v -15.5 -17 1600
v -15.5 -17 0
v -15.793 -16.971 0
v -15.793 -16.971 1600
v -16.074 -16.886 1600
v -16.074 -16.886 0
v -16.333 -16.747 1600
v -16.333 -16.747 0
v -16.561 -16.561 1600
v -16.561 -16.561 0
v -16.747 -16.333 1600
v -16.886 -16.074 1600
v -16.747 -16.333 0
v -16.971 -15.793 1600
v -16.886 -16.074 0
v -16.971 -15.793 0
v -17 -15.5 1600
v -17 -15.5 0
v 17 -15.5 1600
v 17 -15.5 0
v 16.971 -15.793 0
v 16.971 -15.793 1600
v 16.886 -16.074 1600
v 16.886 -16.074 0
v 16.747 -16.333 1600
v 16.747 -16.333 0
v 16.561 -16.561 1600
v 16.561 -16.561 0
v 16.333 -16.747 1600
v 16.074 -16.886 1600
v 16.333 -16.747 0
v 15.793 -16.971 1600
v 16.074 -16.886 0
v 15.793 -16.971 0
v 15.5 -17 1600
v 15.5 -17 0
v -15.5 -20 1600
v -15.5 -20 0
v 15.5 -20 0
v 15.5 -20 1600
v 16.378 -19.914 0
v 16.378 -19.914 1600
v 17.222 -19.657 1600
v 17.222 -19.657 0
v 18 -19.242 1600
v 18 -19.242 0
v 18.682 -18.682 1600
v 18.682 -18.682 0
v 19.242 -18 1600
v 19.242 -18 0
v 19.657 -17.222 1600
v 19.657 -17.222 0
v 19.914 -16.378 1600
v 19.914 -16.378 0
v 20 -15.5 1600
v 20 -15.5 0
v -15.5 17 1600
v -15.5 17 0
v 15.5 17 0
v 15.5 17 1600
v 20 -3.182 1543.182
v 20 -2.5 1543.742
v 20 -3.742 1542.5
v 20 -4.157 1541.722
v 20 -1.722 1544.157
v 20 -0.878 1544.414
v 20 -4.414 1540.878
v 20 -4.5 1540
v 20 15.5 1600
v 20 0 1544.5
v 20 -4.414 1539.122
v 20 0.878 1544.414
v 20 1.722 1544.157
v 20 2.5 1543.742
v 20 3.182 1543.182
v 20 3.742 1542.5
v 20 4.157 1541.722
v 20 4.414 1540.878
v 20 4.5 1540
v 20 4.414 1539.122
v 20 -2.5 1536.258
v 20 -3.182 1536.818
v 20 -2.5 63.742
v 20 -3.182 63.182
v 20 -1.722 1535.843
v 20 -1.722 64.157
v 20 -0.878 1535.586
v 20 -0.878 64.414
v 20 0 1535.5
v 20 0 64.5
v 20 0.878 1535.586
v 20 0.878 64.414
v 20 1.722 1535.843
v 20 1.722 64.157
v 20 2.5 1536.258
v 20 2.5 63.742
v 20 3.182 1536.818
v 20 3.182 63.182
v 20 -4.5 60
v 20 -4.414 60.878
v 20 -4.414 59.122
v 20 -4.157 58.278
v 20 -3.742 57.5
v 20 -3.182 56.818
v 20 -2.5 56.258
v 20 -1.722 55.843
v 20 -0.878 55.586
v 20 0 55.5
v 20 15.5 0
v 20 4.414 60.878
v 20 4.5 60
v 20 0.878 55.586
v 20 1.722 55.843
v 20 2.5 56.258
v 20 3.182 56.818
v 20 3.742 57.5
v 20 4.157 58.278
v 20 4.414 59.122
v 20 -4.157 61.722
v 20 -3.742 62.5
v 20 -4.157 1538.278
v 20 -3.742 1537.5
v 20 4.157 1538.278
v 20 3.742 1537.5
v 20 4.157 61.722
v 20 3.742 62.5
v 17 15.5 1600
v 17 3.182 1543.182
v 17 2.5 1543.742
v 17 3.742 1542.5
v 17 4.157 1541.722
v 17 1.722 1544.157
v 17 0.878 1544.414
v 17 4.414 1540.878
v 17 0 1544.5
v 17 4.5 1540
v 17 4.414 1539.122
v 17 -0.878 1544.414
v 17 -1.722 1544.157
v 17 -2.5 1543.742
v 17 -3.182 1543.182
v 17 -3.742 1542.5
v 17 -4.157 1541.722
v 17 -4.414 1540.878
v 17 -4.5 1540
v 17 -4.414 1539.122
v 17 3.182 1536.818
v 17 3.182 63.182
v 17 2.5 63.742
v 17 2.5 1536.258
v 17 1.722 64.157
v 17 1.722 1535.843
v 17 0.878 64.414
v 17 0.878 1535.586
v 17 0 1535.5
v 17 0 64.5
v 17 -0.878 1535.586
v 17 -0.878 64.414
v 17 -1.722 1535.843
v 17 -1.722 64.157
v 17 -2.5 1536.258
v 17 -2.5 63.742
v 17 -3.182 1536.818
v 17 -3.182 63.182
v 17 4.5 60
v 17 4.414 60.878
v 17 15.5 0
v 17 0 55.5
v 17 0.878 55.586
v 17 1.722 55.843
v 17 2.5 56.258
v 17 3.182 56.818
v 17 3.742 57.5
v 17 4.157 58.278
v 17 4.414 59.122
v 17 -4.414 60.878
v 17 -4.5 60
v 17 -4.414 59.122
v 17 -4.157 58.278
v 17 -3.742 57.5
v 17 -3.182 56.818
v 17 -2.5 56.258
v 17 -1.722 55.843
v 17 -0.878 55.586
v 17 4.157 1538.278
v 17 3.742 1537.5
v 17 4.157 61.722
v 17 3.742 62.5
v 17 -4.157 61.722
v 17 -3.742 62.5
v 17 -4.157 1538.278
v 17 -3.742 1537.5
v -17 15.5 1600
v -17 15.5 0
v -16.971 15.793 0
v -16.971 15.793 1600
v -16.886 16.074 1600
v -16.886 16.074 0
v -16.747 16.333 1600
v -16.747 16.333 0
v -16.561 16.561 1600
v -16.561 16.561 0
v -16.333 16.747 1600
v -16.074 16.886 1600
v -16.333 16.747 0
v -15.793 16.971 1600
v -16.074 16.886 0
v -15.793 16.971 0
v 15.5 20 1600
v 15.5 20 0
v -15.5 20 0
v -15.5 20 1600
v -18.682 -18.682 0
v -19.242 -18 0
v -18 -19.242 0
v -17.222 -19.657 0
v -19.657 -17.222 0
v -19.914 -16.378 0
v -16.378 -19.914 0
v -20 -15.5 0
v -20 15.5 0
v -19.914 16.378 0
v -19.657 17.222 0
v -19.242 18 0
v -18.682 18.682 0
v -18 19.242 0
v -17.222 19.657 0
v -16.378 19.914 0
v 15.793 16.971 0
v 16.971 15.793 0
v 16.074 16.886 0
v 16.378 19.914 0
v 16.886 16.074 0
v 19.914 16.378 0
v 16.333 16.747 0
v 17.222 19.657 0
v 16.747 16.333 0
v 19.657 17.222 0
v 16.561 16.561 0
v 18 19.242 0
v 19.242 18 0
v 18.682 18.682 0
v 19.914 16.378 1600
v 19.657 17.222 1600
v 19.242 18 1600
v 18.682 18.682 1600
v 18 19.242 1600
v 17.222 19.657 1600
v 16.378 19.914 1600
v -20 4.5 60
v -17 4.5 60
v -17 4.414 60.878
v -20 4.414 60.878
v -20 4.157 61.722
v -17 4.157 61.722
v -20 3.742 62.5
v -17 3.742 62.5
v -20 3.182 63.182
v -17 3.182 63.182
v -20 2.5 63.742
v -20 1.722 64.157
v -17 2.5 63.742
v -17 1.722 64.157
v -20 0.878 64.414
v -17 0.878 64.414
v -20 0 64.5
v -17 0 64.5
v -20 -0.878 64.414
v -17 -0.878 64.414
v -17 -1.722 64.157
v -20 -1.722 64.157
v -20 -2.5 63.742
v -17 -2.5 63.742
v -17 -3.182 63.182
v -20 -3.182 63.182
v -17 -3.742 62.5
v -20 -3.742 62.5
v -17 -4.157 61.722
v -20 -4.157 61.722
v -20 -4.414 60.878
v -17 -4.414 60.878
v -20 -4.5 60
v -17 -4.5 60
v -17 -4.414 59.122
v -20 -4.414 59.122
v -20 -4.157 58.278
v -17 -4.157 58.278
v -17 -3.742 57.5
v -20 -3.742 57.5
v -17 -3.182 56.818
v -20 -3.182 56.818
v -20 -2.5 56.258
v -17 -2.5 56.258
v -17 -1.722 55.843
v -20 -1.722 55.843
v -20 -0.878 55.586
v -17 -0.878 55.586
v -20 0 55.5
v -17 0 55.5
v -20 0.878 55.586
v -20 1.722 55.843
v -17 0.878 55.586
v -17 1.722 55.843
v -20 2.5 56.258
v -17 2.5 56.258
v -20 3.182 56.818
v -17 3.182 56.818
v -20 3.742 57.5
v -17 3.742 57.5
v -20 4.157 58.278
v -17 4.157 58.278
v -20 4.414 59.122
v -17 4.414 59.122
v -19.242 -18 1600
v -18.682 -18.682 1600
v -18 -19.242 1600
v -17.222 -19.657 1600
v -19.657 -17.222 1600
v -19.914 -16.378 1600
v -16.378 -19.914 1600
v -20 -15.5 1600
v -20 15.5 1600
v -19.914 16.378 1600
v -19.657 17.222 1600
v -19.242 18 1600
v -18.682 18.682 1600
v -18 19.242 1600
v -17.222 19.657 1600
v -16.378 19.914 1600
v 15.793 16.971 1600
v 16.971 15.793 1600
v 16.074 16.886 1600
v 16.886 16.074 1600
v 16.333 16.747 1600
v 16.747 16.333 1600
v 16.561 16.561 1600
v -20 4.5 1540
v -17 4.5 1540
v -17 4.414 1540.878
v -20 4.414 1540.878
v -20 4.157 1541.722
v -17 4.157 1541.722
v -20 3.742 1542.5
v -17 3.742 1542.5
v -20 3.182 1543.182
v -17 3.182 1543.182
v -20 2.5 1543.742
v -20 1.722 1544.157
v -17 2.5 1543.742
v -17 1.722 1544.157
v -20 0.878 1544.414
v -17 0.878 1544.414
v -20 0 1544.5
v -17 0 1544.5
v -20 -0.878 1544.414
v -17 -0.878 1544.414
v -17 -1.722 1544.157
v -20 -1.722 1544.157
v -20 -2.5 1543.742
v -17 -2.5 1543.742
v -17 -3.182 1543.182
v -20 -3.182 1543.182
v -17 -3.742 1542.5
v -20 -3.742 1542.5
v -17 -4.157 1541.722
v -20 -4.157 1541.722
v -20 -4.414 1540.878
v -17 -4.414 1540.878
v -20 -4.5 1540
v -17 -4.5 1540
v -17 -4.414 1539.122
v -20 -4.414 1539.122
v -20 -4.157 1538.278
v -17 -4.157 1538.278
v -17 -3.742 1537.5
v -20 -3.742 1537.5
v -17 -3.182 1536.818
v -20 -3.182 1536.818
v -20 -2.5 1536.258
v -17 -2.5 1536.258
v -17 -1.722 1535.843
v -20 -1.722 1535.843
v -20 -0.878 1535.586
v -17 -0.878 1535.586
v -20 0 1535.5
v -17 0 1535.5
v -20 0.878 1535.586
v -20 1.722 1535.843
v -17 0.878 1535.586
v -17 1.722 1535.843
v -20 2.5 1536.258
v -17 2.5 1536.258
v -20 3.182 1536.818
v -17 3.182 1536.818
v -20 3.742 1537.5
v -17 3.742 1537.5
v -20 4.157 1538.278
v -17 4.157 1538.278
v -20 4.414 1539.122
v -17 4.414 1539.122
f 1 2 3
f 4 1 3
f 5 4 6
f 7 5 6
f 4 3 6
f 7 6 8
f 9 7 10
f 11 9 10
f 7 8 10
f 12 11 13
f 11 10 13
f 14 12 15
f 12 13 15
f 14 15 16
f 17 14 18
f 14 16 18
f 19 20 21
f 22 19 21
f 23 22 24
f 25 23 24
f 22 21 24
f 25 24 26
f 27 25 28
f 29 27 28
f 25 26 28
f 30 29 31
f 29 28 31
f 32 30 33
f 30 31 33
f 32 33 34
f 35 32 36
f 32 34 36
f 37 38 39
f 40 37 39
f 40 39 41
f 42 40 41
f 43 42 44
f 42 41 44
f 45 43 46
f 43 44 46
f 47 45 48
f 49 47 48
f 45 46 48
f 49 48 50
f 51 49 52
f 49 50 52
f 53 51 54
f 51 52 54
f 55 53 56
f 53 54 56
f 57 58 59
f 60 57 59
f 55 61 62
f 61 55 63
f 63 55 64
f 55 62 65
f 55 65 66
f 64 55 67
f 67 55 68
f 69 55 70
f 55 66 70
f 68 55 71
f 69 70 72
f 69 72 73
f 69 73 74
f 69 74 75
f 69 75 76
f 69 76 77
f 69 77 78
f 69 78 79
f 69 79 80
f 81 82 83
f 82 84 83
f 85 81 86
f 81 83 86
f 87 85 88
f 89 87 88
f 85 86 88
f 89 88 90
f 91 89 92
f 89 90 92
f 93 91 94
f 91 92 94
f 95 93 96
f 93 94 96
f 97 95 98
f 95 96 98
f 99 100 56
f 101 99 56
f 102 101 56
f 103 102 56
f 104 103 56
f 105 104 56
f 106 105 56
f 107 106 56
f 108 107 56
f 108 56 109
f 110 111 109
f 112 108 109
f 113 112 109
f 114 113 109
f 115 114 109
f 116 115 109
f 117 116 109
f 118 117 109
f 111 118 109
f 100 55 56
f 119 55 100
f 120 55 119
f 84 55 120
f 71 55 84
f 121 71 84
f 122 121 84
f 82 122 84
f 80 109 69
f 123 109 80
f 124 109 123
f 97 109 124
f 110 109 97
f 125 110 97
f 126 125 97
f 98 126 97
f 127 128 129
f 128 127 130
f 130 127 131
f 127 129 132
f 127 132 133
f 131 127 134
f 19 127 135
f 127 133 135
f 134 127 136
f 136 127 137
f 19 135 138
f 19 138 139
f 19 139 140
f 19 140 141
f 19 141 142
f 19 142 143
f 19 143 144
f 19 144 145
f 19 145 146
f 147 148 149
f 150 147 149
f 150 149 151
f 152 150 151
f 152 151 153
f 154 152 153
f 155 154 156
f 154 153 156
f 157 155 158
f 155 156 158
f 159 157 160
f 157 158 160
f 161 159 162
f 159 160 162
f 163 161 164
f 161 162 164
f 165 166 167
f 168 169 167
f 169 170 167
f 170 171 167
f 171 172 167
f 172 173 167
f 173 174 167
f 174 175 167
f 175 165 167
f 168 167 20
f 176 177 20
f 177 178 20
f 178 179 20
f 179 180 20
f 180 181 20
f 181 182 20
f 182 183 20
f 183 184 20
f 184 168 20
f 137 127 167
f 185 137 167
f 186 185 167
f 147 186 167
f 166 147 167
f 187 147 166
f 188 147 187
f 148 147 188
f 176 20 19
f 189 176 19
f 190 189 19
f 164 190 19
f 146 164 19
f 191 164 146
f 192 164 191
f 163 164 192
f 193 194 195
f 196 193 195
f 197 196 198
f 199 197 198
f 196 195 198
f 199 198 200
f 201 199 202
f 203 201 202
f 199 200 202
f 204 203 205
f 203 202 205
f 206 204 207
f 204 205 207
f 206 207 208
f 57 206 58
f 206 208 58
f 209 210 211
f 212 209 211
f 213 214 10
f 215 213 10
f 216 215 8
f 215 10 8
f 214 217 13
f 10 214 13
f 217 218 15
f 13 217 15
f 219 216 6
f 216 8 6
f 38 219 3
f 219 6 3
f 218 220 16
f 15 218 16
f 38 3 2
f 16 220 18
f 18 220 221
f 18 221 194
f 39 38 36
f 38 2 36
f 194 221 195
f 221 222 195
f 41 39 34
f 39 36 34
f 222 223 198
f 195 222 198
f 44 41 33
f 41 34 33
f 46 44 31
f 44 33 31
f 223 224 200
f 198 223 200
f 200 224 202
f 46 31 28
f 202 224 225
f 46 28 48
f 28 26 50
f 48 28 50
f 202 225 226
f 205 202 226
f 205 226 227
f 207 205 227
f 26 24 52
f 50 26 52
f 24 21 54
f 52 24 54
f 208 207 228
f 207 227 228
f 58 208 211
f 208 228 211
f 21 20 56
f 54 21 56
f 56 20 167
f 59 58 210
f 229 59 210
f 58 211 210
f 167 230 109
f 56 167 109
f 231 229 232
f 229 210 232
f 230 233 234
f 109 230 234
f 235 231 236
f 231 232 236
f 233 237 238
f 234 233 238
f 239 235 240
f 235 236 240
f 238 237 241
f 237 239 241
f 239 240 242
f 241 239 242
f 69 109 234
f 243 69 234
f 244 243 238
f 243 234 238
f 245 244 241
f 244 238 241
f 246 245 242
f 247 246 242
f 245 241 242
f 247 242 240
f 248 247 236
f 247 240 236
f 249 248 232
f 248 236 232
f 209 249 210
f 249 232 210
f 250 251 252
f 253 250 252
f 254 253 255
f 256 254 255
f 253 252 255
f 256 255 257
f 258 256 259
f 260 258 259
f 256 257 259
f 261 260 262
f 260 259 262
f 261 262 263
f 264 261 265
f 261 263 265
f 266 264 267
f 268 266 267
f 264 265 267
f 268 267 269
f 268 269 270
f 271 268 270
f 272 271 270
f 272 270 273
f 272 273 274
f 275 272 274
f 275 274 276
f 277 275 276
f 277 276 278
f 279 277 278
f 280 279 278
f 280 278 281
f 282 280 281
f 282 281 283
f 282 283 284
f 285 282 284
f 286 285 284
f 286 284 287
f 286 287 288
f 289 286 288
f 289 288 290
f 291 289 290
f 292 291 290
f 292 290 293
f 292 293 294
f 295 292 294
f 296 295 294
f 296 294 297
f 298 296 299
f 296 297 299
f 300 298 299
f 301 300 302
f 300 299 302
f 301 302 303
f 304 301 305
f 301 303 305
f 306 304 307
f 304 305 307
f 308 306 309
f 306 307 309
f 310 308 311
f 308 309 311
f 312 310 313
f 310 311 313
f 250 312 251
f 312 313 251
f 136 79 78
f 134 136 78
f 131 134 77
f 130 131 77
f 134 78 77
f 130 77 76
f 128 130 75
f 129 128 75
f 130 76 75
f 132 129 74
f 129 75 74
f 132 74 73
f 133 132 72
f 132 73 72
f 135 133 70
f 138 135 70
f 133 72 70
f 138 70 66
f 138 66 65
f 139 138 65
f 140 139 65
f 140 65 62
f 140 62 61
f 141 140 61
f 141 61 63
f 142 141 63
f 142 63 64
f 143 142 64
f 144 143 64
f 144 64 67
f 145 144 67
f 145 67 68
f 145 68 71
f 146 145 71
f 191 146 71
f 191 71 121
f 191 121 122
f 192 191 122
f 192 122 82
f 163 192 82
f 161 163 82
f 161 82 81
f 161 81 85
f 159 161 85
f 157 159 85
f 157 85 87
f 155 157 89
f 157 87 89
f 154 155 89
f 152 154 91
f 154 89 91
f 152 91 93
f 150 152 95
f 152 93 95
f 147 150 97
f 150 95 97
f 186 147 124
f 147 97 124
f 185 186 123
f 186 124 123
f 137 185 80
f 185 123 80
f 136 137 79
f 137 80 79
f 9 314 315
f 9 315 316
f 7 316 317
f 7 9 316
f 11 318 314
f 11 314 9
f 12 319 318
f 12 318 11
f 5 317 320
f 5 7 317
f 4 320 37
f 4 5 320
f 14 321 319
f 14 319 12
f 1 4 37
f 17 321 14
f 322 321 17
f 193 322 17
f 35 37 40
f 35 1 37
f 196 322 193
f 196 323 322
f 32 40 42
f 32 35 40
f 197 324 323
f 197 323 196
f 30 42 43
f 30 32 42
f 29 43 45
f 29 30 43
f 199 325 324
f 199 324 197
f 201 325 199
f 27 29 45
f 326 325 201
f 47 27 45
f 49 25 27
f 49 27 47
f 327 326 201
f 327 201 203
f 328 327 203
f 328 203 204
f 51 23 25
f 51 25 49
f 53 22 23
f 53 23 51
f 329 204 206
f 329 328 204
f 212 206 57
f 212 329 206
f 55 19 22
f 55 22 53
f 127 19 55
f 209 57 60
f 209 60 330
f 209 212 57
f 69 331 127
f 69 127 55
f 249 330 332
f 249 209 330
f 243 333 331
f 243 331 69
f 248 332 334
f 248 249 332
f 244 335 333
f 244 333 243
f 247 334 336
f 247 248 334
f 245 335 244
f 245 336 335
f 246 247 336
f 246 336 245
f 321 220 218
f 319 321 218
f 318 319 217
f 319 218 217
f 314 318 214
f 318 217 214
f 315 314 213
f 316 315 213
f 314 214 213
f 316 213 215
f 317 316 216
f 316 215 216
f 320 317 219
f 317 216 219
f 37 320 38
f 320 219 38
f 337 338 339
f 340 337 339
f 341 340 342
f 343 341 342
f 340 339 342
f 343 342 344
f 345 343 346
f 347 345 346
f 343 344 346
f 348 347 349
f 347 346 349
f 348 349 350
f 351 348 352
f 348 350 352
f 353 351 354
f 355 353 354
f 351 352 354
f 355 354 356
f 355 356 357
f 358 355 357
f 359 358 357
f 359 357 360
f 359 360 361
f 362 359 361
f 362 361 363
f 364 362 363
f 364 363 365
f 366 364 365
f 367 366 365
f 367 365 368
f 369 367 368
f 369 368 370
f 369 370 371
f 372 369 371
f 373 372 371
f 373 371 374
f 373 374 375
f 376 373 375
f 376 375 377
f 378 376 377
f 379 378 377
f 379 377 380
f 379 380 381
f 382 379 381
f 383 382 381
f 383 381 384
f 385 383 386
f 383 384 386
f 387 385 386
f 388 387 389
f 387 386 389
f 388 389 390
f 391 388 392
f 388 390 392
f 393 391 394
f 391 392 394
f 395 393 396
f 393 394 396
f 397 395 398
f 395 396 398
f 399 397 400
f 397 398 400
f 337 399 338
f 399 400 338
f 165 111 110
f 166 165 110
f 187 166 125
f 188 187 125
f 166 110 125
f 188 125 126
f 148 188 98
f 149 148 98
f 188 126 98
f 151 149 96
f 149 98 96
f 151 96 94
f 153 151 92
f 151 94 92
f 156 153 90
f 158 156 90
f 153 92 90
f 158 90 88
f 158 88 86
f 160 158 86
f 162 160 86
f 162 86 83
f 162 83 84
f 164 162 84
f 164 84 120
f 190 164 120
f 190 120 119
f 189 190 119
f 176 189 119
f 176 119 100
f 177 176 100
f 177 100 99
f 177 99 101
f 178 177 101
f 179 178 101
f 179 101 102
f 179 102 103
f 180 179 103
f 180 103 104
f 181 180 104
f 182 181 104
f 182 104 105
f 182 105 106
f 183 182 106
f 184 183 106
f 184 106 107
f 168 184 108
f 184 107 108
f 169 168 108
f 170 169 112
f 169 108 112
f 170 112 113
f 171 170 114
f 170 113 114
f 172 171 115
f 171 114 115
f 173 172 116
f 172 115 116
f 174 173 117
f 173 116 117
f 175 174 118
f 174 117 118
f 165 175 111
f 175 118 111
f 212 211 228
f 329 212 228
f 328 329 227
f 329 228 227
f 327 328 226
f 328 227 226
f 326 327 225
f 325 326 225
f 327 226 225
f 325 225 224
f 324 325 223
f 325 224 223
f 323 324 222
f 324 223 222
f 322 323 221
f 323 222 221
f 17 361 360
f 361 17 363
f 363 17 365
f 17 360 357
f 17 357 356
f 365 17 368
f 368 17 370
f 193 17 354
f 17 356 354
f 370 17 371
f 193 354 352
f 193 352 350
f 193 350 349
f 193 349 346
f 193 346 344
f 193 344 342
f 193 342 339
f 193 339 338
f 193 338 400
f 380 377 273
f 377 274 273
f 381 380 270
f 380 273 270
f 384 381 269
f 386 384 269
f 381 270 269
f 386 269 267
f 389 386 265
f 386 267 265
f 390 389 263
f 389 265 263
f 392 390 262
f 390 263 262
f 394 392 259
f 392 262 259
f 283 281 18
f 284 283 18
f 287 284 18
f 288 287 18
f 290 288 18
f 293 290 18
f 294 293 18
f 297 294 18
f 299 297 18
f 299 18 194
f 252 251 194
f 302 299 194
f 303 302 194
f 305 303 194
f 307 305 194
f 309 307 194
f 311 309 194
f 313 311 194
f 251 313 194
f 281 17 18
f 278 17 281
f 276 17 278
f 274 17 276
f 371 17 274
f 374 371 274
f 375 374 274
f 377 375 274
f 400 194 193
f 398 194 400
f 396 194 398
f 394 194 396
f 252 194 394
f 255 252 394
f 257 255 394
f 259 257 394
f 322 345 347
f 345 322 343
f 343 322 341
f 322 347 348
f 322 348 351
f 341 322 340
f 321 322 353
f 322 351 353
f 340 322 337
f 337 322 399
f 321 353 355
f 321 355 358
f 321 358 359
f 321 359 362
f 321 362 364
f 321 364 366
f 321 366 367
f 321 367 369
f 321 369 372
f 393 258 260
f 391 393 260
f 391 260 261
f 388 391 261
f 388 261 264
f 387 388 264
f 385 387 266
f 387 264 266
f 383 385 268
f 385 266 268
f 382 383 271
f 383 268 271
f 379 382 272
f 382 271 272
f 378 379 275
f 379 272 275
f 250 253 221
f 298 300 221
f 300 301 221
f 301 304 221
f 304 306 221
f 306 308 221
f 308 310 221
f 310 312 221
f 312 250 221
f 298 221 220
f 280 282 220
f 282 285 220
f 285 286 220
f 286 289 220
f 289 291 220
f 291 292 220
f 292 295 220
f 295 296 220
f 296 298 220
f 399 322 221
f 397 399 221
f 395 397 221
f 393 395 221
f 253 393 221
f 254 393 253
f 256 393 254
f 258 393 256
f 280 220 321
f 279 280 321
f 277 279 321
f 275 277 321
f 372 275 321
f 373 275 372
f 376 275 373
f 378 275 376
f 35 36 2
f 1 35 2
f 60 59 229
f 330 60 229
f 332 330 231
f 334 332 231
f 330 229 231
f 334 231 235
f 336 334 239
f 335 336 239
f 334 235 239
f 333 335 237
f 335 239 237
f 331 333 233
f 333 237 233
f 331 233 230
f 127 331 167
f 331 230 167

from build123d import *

# Parameters (mm, degrees)
F1_DEPTH = 1600
F2_R     = 4.5
F3_DEPTH = 40.001


with BuildPart() as f1:
    # F0 (on Top) → F1 (new body)
    with BuildSketch(Plane.XY):
        with BuildLine():
            Line((-15.5, -20), (15.5, -20))
            ThreePointArc((15.5, -20), (18.681981, -18.681981), (20, -15.5))
            Line((20, -15.5), (20, 15.5))
            ThreePointArc((20, 15.5), (18.681981, 18.681981), (15.5, 20))
            Line((15.5, 20), (-15.5, 20))
            ThreePointArc((-15.5, 20), (-18.681981, 18.681981), (-20, 15.5))
            Line((-20, 15.5), (-20, -15.5))
            ThreePointArc((-20, -15.5), (-18.681981, -18.681981), (-15.5, -20))
        make_face()
        with BuildLine():
            ThreePointArc((15.5, 17), (16.56066, 16.56066), (17, 15.5))
            Line((17, 15.5), (17, -15.5))
            ThreePointArc((17, -15.5), (16.56066, -16.56066), (15.5, -17))
            Line((15.5, -17), (-15.5, -17))
            ThreePointArc((-15.5, -17), (-16.56066, -16.56066), (-17, -15.5))
            Line((-17, -15.5), (-17, 15.5))
            ThreePointArc((-17, 15.5), (-16.56066, 16.56066), (-15.5, 17))
            Line((-15.5, 17), (15.5, 17))
        make_face(mode=Mode.SUBTRACT)
    extrude(amount=F1_DEPTH)

    # F2 (on face) → F3 (cut, through all)
    with BuildSketch(Plane.YZ.offset(20)):
        with Locations((0, 1540)):
            Circle(F2_R)
        with Locations((0, 60)):
            Circle(F2_R)
    extrude(amount=-F3_DEPTH, mode=Mode.SUBTRACT)


solid = f1.part
